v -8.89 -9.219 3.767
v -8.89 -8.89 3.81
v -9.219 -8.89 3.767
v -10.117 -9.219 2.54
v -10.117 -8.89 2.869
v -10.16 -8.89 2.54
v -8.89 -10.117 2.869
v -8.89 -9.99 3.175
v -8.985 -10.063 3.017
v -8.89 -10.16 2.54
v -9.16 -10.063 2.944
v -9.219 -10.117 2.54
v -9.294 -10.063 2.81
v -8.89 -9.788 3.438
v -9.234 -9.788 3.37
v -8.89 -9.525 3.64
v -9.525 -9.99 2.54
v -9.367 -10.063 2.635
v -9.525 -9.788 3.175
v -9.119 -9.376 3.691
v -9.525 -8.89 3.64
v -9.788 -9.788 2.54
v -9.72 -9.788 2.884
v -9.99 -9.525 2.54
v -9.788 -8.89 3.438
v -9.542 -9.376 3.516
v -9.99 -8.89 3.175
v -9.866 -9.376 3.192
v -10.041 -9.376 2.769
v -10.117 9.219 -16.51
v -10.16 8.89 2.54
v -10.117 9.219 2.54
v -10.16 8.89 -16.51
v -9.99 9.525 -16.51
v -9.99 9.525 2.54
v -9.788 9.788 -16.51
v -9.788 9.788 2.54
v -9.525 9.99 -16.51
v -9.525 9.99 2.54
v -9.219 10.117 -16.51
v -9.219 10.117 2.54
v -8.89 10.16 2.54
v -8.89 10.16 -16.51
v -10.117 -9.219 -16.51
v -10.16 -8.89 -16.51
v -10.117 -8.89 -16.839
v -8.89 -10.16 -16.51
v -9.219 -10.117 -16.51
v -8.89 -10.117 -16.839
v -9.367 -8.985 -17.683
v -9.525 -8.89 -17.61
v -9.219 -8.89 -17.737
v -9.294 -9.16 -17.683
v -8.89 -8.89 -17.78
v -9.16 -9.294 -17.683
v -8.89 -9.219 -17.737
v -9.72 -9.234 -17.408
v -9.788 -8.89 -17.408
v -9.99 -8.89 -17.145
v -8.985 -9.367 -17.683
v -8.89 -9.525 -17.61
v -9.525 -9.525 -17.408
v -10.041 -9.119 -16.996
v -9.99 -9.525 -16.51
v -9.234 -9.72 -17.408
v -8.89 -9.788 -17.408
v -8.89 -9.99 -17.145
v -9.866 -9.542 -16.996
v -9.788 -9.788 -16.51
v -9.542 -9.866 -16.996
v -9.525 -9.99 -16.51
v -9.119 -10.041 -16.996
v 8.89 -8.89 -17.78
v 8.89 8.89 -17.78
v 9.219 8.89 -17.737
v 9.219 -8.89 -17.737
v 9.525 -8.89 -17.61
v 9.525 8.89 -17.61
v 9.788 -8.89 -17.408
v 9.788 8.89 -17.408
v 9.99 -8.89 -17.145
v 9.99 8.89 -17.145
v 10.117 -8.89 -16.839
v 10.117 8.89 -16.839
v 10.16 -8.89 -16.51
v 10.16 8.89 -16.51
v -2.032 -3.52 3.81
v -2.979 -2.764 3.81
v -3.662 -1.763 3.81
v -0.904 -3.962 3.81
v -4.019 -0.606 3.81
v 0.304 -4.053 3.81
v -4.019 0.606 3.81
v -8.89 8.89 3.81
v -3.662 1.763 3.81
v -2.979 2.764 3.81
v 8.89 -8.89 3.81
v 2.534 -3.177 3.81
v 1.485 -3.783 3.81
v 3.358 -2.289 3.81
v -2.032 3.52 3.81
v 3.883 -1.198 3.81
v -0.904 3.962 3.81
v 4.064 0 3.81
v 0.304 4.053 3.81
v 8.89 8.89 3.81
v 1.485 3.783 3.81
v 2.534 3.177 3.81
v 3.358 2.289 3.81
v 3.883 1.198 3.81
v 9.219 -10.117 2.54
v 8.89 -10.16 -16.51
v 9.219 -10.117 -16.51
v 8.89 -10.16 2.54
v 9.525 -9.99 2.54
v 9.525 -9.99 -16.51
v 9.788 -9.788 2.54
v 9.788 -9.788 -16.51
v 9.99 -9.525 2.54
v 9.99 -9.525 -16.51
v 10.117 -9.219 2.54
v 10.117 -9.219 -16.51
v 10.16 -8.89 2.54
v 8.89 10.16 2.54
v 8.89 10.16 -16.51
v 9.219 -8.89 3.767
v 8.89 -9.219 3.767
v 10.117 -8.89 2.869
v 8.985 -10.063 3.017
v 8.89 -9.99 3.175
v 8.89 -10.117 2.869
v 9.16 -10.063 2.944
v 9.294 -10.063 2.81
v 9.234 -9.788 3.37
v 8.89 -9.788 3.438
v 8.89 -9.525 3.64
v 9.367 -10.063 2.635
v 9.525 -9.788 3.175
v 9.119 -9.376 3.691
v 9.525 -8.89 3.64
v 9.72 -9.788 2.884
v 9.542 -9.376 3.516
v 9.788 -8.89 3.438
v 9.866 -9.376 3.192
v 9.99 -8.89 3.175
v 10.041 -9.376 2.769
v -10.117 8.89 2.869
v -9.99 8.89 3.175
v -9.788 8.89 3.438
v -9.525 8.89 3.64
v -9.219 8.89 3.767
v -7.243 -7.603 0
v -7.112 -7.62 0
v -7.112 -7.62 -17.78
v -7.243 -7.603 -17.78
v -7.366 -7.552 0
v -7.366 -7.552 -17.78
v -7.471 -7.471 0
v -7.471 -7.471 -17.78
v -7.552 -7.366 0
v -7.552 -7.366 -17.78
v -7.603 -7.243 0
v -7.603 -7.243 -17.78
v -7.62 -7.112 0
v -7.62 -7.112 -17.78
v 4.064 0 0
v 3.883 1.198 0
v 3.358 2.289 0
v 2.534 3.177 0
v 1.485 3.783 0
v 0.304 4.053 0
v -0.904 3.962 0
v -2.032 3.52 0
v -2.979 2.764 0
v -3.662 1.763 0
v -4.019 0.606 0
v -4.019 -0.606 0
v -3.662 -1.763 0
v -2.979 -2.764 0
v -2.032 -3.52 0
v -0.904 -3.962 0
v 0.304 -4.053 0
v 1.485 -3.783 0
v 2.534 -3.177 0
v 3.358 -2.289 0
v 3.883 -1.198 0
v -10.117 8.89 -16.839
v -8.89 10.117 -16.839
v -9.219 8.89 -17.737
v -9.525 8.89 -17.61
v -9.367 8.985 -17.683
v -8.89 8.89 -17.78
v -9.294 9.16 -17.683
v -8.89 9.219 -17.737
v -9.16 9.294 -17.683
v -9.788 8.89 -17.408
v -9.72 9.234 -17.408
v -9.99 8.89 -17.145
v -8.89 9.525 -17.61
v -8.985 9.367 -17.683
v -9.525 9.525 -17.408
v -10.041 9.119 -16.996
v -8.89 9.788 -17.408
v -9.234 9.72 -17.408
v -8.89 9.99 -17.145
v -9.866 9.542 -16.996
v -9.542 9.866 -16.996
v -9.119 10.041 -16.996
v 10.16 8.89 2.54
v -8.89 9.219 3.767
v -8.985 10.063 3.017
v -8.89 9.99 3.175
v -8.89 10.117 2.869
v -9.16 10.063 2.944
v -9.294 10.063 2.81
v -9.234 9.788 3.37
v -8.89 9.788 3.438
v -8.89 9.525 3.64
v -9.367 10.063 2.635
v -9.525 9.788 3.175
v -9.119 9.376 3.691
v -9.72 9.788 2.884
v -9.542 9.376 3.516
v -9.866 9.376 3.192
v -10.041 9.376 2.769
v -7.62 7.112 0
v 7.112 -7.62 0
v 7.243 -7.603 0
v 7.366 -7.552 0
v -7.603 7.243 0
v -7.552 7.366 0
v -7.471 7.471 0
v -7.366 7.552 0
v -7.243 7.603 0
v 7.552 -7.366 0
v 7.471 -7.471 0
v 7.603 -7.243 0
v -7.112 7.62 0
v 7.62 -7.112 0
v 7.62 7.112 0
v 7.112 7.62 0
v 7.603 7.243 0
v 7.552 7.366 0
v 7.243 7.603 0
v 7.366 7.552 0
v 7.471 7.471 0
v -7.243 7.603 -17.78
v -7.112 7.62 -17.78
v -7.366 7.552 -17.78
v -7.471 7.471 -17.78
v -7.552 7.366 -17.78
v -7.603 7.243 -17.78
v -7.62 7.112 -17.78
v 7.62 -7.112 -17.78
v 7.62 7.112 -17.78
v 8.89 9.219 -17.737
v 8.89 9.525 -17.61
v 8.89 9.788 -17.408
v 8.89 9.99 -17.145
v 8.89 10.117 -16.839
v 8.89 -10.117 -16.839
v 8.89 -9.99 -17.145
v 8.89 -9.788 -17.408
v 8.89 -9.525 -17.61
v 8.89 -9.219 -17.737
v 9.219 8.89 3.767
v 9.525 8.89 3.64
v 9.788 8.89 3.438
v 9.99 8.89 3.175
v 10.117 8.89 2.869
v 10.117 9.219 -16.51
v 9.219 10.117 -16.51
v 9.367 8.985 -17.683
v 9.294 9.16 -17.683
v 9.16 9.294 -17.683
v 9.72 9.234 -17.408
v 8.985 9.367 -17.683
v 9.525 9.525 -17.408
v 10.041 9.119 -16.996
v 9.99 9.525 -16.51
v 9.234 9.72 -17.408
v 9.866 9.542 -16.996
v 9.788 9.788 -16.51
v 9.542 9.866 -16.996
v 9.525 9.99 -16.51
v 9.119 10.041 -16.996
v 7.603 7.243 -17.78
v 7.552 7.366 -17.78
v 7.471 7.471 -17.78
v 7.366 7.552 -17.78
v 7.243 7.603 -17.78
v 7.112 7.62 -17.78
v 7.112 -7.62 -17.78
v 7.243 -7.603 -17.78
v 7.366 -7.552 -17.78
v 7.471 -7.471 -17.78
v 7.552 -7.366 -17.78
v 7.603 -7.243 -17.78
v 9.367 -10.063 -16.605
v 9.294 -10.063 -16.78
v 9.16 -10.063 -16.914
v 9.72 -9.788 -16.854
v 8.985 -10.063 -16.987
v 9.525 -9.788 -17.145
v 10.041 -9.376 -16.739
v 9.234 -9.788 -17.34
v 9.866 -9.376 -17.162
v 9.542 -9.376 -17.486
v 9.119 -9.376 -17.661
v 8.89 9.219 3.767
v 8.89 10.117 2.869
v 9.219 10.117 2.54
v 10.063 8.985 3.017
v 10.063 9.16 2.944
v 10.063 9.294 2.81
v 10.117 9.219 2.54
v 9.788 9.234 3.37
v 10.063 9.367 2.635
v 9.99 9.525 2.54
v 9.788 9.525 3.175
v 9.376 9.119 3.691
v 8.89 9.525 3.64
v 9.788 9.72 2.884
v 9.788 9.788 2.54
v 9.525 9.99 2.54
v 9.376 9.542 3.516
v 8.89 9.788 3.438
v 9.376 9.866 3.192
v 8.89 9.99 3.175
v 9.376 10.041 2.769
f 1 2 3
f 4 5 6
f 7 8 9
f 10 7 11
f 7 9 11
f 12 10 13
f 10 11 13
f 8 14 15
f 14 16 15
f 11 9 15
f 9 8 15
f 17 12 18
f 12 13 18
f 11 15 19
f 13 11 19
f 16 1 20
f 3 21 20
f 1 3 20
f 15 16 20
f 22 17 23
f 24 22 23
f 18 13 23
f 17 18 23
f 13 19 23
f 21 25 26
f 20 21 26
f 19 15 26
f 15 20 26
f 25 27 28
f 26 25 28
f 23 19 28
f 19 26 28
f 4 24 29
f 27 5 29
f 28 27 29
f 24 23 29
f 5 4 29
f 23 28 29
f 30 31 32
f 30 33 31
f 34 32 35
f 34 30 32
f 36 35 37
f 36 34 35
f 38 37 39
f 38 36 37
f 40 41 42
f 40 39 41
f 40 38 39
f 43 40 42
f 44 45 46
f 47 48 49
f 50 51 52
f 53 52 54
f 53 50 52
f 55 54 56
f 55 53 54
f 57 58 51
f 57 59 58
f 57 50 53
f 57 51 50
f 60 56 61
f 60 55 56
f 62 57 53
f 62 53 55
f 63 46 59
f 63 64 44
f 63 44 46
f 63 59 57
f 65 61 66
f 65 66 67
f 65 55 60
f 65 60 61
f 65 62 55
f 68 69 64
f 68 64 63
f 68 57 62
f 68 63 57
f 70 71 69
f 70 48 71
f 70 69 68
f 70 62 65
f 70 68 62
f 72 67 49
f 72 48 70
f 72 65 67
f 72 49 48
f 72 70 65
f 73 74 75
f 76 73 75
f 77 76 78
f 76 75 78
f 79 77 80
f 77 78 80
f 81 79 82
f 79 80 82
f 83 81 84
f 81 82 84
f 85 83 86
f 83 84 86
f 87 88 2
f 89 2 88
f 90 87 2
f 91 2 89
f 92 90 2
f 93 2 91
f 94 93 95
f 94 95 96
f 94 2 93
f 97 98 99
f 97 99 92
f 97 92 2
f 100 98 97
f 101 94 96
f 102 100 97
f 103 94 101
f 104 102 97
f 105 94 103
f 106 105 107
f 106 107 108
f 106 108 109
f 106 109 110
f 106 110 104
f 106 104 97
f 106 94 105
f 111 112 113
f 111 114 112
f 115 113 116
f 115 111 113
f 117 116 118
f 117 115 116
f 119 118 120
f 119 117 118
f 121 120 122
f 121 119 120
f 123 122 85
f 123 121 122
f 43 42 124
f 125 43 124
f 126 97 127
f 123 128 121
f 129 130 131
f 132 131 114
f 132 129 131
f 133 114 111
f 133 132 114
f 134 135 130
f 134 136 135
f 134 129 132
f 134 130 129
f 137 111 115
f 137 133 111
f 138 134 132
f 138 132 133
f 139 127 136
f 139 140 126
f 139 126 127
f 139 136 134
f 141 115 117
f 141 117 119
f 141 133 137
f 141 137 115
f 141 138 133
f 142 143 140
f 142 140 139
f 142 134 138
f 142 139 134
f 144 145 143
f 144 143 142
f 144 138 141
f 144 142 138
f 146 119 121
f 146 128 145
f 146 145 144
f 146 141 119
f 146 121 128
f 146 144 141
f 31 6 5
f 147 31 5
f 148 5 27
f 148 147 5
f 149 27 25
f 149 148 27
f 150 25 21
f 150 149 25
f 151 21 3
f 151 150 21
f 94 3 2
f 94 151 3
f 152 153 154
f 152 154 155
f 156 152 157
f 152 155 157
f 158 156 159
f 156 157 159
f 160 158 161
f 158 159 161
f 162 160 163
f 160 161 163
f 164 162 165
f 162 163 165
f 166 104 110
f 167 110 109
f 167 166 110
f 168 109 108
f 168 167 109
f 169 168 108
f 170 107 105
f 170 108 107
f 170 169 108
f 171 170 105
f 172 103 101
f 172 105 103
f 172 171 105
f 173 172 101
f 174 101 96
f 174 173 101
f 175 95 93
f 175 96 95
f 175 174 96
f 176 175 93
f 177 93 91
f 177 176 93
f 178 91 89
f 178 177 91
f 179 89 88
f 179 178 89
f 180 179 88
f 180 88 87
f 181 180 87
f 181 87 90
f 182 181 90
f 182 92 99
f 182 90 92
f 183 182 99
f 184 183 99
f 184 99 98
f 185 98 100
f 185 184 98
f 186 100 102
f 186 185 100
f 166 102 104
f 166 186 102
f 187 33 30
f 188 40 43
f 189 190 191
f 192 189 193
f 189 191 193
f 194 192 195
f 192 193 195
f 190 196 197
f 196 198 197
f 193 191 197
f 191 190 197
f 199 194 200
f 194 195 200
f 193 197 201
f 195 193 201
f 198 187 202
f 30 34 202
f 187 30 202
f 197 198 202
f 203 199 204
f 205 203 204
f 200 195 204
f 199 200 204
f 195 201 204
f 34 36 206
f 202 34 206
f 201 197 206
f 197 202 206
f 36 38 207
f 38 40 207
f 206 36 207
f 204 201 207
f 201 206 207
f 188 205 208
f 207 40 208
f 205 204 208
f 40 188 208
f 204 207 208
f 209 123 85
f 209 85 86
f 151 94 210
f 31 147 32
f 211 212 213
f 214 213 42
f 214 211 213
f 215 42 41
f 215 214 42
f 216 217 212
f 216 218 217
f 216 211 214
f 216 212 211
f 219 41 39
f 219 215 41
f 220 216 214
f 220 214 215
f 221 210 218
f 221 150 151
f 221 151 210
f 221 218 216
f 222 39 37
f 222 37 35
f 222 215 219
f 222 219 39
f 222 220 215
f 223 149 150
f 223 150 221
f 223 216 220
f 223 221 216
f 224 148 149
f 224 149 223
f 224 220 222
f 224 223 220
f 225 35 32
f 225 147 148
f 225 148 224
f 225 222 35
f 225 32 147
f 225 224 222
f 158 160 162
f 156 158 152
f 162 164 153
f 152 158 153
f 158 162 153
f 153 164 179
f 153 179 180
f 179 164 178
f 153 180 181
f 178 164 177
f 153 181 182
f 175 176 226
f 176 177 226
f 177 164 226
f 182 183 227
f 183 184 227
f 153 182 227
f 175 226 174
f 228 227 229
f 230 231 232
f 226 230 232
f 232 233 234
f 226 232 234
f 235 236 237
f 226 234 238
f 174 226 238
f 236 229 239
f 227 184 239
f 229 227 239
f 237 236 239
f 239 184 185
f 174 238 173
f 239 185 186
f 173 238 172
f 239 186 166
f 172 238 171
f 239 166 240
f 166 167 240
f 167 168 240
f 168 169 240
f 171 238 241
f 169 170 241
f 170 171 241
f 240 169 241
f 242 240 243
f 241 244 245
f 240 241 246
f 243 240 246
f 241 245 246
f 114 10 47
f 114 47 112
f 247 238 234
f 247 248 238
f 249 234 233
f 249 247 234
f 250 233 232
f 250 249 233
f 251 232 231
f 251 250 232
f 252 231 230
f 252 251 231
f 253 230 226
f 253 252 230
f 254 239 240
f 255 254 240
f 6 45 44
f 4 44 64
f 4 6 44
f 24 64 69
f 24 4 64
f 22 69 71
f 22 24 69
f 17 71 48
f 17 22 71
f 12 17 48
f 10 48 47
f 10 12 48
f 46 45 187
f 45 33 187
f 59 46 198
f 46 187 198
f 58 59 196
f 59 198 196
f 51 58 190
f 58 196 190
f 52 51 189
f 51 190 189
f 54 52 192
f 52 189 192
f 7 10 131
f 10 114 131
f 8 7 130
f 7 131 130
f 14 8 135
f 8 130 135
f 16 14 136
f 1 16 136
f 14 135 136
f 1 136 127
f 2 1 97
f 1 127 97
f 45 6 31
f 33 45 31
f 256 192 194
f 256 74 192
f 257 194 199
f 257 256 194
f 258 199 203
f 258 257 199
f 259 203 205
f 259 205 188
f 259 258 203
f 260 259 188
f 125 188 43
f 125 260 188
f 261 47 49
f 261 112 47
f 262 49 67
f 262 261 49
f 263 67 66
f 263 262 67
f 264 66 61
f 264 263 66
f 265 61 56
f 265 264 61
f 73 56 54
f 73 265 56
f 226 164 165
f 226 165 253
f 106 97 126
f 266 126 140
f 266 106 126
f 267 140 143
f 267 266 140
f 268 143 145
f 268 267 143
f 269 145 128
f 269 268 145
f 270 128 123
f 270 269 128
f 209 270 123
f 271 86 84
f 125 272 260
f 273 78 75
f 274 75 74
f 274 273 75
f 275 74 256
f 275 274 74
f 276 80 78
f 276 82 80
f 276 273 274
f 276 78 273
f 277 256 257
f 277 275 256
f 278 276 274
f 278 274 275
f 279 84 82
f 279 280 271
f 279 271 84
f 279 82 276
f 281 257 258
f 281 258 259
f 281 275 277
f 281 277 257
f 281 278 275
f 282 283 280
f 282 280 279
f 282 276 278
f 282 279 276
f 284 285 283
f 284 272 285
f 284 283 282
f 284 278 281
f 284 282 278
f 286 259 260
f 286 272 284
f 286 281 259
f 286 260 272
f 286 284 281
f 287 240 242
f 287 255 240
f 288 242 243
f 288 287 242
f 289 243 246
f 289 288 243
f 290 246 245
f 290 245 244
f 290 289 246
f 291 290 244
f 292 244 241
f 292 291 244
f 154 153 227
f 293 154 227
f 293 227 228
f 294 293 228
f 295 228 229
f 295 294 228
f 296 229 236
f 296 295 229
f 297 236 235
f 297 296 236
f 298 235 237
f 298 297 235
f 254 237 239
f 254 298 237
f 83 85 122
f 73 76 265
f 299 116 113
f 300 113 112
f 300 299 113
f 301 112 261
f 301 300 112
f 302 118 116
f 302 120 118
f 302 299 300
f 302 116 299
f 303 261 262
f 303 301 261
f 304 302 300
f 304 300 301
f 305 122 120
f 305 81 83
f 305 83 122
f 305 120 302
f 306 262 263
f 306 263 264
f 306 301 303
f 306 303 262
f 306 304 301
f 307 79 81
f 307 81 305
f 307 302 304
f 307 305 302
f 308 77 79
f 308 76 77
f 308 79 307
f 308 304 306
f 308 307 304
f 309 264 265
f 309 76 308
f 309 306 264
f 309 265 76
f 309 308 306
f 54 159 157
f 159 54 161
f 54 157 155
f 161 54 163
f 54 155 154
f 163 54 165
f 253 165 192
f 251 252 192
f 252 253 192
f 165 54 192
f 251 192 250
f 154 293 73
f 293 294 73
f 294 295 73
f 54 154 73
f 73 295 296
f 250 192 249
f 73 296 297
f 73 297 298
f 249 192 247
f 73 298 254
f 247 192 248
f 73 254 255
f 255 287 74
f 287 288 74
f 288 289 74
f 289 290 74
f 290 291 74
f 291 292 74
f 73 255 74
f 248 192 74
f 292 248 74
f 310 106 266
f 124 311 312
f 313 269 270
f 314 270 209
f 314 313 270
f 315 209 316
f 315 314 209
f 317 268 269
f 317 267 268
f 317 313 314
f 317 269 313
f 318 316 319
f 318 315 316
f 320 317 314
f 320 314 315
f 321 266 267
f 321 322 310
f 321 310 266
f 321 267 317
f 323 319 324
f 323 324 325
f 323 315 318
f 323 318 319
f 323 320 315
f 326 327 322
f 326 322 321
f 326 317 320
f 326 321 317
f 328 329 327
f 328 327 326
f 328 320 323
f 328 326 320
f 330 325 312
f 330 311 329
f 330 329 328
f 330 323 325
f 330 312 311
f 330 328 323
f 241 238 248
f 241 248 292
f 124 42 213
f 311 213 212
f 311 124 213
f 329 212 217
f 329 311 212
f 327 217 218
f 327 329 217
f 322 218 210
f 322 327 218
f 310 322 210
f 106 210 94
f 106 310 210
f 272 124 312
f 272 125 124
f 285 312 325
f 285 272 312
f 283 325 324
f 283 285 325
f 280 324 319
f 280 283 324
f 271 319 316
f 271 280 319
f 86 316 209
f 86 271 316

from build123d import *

# Parameters (mm, degrees)
F0_W     = 20.32
F0_H     = 20.32
F0_W_2   = 15.24
F0_H_2   = 15.24
F1_DEPTH = 3.81
F2_DEPTH = 17.78
F3_R     = 4.064
F4_DEPTH = 25.4
F5_R     = 1.27
F6_R     = 0.508


with BuildPart() as f1:
    # F0 (on Top) → F1 (new body)
    with BuildSketch(Plane.XY):
        Rectangle(F0_W, F0_H)
        Rectangle(F0_W_2, F0_H_2, mode=Mode.SUBTRACT)
        Rectangle(F0_W_2, F0_H_2)
    extrude(amount=F1_DEPTH)

    # F0 (on Top) → F2 (join)
    with BuildSketch(Plane.XY):
        Rectangle(F0_W, F0_H)
        Rectangle(F0_W_2, F0_H_2, mode=Mode.SUBTRACT)
    extrude(amount=-F2_DEPTH)

    # F3 (on Top) → F4 (cut)
    with BuildSketch(Plane.XY):
        Circle(F3_R)
    extrude(amount=F4_DEPTH, mode=Mode.SUBTRACT)

    # F5
    f5_edges = [f1.edges().sort_by_distance(p)[0] for p in [
        (-10.16, 0, 3.81),
        (0, 10.16, 3.81),
        (10.16, 0, 3.81),
        (0, -10.16, 3.81),
        (-10.16, 10.16, -6.985),
        (-10.16, -10.16, -6.985),
        (-10.16, 0, -17.78),
        (10.16, 10.16, -6.985),
        (10.16, 0, -17.78),
        (10.16, -10.16, -6.985),
        (0, -10.16, -17.78),
        (0, 10.16, -17.78),
    ]]
    fillet(f5_edges, radius=F5_R)

    # F6
    f6_edges = [f1.edges().sort_by_distance(p)[0] for p in [
        (-7.62, -7.62, -8.89),
        (7.62, -7.62, -8.89),
        (7.62, 7.62, -8.89),
        (-7.62, 7.62, -8.89),
    ]]
    fillet(f6_edges, radius=F6_R)


solid = f1.part
